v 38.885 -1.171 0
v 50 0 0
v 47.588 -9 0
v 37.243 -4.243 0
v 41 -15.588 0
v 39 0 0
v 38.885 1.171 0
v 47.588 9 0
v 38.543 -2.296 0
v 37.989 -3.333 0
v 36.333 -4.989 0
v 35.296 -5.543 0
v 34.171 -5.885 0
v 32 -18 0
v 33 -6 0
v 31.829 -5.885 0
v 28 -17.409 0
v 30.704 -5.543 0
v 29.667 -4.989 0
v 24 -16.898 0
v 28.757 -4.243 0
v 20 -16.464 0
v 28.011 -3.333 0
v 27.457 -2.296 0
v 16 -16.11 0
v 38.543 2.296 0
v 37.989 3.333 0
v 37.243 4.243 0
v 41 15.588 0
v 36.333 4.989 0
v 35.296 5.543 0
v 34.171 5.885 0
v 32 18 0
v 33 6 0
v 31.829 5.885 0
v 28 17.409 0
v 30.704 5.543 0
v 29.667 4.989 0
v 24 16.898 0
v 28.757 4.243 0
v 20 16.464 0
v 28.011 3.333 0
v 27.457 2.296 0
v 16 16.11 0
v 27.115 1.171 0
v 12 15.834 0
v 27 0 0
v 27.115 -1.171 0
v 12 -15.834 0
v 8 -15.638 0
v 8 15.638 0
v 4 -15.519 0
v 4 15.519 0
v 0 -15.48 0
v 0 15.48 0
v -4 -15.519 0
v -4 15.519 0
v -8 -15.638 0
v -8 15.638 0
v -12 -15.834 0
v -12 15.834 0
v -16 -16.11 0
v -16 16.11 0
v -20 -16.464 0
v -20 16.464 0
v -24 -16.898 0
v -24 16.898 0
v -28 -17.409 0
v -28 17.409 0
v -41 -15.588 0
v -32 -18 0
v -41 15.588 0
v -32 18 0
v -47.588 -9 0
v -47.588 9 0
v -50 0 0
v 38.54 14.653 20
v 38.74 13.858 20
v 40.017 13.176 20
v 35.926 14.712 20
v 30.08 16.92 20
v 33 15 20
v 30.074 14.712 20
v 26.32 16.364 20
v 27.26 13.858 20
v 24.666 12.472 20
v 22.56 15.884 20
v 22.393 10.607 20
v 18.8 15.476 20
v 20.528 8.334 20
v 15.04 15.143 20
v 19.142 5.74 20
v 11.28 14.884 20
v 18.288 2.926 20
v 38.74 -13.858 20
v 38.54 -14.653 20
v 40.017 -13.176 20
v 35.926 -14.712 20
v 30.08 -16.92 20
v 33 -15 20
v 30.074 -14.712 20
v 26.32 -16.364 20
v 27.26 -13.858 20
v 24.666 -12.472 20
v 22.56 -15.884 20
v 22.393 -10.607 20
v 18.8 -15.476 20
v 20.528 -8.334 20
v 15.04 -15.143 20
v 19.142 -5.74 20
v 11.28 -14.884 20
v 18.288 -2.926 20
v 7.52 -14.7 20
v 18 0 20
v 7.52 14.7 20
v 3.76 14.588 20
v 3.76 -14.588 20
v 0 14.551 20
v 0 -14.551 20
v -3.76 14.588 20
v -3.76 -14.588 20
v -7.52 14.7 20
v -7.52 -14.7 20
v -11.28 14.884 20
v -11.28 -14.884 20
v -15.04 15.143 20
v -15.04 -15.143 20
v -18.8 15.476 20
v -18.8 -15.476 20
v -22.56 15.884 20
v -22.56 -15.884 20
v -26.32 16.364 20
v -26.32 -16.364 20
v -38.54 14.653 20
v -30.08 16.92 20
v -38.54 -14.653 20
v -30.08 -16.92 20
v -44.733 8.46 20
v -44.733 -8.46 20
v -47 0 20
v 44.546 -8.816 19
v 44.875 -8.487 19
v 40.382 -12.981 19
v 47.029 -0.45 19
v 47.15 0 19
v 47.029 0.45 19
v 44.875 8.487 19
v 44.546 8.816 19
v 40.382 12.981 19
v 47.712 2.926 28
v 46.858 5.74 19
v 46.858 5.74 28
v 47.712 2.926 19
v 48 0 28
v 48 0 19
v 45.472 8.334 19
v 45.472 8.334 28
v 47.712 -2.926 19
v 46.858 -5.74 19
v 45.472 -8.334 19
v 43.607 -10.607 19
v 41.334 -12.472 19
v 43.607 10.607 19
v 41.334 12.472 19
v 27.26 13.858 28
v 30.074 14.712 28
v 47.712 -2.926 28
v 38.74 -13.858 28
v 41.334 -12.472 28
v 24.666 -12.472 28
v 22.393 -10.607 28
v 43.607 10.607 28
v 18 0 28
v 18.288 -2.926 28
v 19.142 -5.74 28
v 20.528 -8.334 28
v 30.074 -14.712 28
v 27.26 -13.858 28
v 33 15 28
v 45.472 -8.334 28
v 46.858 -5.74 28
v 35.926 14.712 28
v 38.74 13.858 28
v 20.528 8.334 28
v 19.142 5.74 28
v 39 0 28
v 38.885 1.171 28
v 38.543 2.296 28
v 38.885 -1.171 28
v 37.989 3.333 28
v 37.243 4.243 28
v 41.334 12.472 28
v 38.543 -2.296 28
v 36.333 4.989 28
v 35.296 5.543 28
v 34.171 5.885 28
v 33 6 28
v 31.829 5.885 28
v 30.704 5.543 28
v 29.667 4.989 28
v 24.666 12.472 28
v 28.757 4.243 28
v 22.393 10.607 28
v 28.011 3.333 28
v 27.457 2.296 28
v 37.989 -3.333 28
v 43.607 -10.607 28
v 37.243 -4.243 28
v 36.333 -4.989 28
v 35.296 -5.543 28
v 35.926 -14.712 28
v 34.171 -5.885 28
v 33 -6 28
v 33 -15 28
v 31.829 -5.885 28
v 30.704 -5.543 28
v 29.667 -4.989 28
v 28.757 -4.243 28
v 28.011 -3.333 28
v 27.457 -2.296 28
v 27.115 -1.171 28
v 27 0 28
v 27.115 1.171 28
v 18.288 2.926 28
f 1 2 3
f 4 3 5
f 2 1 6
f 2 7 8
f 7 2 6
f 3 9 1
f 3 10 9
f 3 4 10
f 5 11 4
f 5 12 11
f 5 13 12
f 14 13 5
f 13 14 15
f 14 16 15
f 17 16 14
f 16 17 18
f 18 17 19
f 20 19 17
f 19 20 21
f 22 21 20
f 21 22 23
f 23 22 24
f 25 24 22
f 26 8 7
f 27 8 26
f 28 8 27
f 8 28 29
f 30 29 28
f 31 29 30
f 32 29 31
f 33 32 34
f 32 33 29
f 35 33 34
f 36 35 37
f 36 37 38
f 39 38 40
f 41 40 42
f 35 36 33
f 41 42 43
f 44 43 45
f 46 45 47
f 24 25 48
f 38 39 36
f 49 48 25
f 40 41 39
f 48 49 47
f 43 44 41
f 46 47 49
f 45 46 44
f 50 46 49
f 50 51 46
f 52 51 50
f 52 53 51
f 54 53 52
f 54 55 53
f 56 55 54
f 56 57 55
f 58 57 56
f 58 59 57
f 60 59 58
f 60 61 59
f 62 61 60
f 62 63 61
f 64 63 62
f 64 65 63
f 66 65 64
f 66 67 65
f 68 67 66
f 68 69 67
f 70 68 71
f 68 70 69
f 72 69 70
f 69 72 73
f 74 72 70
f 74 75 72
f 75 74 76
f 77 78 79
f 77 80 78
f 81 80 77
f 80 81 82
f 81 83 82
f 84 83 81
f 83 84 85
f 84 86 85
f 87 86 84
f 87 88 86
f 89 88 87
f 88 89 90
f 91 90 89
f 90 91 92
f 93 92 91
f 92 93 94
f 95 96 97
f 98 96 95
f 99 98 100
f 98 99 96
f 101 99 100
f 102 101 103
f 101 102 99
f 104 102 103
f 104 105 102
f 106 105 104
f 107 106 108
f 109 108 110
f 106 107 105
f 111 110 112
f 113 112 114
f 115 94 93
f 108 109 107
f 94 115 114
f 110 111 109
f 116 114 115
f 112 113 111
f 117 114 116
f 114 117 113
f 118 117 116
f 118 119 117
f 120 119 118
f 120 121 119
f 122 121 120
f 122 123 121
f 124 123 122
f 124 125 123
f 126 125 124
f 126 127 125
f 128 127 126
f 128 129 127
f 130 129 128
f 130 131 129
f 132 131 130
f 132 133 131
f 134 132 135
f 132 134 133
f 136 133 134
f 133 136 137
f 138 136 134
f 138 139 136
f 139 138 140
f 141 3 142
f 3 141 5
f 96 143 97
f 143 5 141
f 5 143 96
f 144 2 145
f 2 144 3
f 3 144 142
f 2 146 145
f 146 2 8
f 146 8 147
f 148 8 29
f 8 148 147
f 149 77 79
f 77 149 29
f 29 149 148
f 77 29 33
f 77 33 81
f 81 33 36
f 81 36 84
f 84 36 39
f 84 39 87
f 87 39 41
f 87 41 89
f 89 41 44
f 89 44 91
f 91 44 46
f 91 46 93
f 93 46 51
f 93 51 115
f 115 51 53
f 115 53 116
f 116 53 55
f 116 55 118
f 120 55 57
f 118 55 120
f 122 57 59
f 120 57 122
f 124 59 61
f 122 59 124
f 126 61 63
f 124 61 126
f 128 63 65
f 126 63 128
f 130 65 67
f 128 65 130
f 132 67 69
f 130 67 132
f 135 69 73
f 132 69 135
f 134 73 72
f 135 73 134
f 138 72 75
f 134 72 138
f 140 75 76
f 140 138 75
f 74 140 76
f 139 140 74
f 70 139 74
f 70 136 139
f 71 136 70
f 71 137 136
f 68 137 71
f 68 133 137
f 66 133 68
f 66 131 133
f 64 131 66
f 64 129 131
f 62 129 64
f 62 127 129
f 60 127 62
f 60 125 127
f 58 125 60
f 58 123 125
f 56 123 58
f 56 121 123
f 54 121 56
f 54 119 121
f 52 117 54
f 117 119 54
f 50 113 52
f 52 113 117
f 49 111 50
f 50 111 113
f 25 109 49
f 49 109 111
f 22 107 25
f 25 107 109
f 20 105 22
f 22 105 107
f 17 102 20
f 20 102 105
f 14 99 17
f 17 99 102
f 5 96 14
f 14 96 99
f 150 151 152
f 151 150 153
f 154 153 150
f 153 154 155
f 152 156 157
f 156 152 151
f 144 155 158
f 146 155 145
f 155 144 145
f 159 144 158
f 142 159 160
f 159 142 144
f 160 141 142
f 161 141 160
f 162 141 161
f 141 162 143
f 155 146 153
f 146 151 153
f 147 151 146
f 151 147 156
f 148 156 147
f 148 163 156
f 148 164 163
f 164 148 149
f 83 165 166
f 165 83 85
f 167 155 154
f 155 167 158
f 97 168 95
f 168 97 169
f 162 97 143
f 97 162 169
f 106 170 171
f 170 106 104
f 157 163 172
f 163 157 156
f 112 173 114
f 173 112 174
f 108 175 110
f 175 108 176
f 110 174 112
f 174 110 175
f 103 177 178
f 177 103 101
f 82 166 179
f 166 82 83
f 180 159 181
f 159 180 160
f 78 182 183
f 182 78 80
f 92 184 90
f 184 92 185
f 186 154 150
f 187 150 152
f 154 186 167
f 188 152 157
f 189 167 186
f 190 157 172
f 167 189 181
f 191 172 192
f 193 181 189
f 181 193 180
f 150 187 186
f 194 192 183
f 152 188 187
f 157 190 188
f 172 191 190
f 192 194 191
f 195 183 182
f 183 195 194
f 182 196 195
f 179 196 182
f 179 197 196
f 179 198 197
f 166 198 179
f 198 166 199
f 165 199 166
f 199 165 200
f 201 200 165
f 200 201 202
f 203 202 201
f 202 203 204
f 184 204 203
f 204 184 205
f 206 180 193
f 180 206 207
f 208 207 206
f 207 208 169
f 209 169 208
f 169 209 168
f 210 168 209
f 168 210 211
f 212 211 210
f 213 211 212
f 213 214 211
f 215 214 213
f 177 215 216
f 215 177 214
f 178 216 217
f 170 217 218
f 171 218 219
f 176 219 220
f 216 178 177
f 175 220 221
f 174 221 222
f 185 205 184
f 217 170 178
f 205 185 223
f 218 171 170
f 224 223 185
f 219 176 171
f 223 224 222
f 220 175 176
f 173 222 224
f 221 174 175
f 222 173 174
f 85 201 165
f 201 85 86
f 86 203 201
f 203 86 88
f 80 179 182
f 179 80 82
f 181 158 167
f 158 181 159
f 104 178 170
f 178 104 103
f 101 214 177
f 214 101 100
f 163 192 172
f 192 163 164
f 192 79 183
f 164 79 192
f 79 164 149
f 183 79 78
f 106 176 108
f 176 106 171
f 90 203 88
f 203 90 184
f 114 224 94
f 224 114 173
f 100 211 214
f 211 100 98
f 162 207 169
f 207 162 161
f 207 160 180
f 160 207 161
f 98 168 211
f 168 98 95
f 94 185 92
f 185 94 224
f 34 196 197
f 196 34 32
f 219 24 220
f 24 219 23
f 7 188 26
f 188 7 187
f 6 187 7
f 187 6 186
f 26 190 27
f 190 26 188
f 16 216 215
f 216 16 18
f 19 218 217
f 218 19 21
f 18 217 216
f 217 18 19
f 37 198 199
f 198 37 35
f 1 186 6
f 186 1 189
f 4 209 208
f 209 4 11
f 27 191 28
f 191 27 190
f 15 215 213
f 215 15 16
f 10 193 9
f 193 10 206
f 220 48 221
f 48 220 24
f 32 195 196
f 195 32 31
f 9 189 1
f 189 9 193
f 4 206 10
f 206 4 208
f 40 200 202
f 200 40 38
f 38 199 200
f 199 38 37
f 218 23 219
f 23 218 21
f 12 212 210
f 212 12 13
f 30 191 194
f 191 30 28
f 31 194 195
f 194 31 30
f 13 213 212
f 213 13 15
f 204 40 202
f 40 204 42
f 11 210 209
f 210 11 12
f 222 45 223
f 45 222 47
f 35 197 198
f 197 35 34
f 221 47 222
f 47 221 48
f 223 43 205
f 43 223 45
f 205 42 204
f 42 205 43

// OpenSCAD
$fn = 32;

// ----------------------------------------------------------------------
// Handle: 100 x 36 mm grip, 20 mm thick
// ----------------------------------------------------------------------

// --- parameters (mm) ---
length = 100;             // grip length
width = 36;               // grip width
thickness = 20;           // grip thickness
waist = 0.86;             // width factor at the middle
draft = 0.94;             // top face scale of the extrusion
boss_d = 30;              // mounting boss diameter
boss_h = 8;               // mounting boss height
boss_hole_d = 12;         // screw clearance through the boss
boss_r = 33;              // boss centre from the grip centre

/* ergonomic grip outline, closed spline-like polygon in the XY plane */
grip = [[-32, 18], [-28, 17.409], [-24, 16.898], [-20, 16.464], [-16, 16.11], [-12, 15.834], [-8, 15.638], [-4, 15.519], [0, 15.48], [4, 15.519], [8, 15.638], [12, 15.834], [16, 16.11], [20, 16.464], [24, 16.898], [28, 17.409], [32, 18], [41, 15.588], [47.588, 9], [50, 0], [47.588, -9], [41, -15.588], [32, -18], [32, -18], [28, -17.409], [24, -16.898], [20, -16.464], [16, -16.11], [12, -15.834], [8, -15.638], [4, -15.519], [0, -15.48], [-4, -15.519], [-8, -15.638], [-12, -15.834], [-16, -16.11], [-20, -16.464], [-24, -16.898], [-28, -17.409], [-32, -18], [-41, -15.588], [-47.588, -9], [-50, 0], [-47.588, 9], [-41, 15.588], [-32, 18]];

module grip_body() {
  linear_extrude(height = thickness, scale = draft) polygon(grip);
}

module boss_body() {
  /* sunk 1 mm into the grip so the joint overlaps */
  translate([boss_r, 0, thickness - 1]) cylinder(h = boss_h + 1, d = boss_d);
}

difference() {
  union() {
    grip_body();
    boss_body();
  }
  translate([boss_r, 0, -1]) cylinder(h = thickness + boss_h + 2, d = boss_hole_d);
}
